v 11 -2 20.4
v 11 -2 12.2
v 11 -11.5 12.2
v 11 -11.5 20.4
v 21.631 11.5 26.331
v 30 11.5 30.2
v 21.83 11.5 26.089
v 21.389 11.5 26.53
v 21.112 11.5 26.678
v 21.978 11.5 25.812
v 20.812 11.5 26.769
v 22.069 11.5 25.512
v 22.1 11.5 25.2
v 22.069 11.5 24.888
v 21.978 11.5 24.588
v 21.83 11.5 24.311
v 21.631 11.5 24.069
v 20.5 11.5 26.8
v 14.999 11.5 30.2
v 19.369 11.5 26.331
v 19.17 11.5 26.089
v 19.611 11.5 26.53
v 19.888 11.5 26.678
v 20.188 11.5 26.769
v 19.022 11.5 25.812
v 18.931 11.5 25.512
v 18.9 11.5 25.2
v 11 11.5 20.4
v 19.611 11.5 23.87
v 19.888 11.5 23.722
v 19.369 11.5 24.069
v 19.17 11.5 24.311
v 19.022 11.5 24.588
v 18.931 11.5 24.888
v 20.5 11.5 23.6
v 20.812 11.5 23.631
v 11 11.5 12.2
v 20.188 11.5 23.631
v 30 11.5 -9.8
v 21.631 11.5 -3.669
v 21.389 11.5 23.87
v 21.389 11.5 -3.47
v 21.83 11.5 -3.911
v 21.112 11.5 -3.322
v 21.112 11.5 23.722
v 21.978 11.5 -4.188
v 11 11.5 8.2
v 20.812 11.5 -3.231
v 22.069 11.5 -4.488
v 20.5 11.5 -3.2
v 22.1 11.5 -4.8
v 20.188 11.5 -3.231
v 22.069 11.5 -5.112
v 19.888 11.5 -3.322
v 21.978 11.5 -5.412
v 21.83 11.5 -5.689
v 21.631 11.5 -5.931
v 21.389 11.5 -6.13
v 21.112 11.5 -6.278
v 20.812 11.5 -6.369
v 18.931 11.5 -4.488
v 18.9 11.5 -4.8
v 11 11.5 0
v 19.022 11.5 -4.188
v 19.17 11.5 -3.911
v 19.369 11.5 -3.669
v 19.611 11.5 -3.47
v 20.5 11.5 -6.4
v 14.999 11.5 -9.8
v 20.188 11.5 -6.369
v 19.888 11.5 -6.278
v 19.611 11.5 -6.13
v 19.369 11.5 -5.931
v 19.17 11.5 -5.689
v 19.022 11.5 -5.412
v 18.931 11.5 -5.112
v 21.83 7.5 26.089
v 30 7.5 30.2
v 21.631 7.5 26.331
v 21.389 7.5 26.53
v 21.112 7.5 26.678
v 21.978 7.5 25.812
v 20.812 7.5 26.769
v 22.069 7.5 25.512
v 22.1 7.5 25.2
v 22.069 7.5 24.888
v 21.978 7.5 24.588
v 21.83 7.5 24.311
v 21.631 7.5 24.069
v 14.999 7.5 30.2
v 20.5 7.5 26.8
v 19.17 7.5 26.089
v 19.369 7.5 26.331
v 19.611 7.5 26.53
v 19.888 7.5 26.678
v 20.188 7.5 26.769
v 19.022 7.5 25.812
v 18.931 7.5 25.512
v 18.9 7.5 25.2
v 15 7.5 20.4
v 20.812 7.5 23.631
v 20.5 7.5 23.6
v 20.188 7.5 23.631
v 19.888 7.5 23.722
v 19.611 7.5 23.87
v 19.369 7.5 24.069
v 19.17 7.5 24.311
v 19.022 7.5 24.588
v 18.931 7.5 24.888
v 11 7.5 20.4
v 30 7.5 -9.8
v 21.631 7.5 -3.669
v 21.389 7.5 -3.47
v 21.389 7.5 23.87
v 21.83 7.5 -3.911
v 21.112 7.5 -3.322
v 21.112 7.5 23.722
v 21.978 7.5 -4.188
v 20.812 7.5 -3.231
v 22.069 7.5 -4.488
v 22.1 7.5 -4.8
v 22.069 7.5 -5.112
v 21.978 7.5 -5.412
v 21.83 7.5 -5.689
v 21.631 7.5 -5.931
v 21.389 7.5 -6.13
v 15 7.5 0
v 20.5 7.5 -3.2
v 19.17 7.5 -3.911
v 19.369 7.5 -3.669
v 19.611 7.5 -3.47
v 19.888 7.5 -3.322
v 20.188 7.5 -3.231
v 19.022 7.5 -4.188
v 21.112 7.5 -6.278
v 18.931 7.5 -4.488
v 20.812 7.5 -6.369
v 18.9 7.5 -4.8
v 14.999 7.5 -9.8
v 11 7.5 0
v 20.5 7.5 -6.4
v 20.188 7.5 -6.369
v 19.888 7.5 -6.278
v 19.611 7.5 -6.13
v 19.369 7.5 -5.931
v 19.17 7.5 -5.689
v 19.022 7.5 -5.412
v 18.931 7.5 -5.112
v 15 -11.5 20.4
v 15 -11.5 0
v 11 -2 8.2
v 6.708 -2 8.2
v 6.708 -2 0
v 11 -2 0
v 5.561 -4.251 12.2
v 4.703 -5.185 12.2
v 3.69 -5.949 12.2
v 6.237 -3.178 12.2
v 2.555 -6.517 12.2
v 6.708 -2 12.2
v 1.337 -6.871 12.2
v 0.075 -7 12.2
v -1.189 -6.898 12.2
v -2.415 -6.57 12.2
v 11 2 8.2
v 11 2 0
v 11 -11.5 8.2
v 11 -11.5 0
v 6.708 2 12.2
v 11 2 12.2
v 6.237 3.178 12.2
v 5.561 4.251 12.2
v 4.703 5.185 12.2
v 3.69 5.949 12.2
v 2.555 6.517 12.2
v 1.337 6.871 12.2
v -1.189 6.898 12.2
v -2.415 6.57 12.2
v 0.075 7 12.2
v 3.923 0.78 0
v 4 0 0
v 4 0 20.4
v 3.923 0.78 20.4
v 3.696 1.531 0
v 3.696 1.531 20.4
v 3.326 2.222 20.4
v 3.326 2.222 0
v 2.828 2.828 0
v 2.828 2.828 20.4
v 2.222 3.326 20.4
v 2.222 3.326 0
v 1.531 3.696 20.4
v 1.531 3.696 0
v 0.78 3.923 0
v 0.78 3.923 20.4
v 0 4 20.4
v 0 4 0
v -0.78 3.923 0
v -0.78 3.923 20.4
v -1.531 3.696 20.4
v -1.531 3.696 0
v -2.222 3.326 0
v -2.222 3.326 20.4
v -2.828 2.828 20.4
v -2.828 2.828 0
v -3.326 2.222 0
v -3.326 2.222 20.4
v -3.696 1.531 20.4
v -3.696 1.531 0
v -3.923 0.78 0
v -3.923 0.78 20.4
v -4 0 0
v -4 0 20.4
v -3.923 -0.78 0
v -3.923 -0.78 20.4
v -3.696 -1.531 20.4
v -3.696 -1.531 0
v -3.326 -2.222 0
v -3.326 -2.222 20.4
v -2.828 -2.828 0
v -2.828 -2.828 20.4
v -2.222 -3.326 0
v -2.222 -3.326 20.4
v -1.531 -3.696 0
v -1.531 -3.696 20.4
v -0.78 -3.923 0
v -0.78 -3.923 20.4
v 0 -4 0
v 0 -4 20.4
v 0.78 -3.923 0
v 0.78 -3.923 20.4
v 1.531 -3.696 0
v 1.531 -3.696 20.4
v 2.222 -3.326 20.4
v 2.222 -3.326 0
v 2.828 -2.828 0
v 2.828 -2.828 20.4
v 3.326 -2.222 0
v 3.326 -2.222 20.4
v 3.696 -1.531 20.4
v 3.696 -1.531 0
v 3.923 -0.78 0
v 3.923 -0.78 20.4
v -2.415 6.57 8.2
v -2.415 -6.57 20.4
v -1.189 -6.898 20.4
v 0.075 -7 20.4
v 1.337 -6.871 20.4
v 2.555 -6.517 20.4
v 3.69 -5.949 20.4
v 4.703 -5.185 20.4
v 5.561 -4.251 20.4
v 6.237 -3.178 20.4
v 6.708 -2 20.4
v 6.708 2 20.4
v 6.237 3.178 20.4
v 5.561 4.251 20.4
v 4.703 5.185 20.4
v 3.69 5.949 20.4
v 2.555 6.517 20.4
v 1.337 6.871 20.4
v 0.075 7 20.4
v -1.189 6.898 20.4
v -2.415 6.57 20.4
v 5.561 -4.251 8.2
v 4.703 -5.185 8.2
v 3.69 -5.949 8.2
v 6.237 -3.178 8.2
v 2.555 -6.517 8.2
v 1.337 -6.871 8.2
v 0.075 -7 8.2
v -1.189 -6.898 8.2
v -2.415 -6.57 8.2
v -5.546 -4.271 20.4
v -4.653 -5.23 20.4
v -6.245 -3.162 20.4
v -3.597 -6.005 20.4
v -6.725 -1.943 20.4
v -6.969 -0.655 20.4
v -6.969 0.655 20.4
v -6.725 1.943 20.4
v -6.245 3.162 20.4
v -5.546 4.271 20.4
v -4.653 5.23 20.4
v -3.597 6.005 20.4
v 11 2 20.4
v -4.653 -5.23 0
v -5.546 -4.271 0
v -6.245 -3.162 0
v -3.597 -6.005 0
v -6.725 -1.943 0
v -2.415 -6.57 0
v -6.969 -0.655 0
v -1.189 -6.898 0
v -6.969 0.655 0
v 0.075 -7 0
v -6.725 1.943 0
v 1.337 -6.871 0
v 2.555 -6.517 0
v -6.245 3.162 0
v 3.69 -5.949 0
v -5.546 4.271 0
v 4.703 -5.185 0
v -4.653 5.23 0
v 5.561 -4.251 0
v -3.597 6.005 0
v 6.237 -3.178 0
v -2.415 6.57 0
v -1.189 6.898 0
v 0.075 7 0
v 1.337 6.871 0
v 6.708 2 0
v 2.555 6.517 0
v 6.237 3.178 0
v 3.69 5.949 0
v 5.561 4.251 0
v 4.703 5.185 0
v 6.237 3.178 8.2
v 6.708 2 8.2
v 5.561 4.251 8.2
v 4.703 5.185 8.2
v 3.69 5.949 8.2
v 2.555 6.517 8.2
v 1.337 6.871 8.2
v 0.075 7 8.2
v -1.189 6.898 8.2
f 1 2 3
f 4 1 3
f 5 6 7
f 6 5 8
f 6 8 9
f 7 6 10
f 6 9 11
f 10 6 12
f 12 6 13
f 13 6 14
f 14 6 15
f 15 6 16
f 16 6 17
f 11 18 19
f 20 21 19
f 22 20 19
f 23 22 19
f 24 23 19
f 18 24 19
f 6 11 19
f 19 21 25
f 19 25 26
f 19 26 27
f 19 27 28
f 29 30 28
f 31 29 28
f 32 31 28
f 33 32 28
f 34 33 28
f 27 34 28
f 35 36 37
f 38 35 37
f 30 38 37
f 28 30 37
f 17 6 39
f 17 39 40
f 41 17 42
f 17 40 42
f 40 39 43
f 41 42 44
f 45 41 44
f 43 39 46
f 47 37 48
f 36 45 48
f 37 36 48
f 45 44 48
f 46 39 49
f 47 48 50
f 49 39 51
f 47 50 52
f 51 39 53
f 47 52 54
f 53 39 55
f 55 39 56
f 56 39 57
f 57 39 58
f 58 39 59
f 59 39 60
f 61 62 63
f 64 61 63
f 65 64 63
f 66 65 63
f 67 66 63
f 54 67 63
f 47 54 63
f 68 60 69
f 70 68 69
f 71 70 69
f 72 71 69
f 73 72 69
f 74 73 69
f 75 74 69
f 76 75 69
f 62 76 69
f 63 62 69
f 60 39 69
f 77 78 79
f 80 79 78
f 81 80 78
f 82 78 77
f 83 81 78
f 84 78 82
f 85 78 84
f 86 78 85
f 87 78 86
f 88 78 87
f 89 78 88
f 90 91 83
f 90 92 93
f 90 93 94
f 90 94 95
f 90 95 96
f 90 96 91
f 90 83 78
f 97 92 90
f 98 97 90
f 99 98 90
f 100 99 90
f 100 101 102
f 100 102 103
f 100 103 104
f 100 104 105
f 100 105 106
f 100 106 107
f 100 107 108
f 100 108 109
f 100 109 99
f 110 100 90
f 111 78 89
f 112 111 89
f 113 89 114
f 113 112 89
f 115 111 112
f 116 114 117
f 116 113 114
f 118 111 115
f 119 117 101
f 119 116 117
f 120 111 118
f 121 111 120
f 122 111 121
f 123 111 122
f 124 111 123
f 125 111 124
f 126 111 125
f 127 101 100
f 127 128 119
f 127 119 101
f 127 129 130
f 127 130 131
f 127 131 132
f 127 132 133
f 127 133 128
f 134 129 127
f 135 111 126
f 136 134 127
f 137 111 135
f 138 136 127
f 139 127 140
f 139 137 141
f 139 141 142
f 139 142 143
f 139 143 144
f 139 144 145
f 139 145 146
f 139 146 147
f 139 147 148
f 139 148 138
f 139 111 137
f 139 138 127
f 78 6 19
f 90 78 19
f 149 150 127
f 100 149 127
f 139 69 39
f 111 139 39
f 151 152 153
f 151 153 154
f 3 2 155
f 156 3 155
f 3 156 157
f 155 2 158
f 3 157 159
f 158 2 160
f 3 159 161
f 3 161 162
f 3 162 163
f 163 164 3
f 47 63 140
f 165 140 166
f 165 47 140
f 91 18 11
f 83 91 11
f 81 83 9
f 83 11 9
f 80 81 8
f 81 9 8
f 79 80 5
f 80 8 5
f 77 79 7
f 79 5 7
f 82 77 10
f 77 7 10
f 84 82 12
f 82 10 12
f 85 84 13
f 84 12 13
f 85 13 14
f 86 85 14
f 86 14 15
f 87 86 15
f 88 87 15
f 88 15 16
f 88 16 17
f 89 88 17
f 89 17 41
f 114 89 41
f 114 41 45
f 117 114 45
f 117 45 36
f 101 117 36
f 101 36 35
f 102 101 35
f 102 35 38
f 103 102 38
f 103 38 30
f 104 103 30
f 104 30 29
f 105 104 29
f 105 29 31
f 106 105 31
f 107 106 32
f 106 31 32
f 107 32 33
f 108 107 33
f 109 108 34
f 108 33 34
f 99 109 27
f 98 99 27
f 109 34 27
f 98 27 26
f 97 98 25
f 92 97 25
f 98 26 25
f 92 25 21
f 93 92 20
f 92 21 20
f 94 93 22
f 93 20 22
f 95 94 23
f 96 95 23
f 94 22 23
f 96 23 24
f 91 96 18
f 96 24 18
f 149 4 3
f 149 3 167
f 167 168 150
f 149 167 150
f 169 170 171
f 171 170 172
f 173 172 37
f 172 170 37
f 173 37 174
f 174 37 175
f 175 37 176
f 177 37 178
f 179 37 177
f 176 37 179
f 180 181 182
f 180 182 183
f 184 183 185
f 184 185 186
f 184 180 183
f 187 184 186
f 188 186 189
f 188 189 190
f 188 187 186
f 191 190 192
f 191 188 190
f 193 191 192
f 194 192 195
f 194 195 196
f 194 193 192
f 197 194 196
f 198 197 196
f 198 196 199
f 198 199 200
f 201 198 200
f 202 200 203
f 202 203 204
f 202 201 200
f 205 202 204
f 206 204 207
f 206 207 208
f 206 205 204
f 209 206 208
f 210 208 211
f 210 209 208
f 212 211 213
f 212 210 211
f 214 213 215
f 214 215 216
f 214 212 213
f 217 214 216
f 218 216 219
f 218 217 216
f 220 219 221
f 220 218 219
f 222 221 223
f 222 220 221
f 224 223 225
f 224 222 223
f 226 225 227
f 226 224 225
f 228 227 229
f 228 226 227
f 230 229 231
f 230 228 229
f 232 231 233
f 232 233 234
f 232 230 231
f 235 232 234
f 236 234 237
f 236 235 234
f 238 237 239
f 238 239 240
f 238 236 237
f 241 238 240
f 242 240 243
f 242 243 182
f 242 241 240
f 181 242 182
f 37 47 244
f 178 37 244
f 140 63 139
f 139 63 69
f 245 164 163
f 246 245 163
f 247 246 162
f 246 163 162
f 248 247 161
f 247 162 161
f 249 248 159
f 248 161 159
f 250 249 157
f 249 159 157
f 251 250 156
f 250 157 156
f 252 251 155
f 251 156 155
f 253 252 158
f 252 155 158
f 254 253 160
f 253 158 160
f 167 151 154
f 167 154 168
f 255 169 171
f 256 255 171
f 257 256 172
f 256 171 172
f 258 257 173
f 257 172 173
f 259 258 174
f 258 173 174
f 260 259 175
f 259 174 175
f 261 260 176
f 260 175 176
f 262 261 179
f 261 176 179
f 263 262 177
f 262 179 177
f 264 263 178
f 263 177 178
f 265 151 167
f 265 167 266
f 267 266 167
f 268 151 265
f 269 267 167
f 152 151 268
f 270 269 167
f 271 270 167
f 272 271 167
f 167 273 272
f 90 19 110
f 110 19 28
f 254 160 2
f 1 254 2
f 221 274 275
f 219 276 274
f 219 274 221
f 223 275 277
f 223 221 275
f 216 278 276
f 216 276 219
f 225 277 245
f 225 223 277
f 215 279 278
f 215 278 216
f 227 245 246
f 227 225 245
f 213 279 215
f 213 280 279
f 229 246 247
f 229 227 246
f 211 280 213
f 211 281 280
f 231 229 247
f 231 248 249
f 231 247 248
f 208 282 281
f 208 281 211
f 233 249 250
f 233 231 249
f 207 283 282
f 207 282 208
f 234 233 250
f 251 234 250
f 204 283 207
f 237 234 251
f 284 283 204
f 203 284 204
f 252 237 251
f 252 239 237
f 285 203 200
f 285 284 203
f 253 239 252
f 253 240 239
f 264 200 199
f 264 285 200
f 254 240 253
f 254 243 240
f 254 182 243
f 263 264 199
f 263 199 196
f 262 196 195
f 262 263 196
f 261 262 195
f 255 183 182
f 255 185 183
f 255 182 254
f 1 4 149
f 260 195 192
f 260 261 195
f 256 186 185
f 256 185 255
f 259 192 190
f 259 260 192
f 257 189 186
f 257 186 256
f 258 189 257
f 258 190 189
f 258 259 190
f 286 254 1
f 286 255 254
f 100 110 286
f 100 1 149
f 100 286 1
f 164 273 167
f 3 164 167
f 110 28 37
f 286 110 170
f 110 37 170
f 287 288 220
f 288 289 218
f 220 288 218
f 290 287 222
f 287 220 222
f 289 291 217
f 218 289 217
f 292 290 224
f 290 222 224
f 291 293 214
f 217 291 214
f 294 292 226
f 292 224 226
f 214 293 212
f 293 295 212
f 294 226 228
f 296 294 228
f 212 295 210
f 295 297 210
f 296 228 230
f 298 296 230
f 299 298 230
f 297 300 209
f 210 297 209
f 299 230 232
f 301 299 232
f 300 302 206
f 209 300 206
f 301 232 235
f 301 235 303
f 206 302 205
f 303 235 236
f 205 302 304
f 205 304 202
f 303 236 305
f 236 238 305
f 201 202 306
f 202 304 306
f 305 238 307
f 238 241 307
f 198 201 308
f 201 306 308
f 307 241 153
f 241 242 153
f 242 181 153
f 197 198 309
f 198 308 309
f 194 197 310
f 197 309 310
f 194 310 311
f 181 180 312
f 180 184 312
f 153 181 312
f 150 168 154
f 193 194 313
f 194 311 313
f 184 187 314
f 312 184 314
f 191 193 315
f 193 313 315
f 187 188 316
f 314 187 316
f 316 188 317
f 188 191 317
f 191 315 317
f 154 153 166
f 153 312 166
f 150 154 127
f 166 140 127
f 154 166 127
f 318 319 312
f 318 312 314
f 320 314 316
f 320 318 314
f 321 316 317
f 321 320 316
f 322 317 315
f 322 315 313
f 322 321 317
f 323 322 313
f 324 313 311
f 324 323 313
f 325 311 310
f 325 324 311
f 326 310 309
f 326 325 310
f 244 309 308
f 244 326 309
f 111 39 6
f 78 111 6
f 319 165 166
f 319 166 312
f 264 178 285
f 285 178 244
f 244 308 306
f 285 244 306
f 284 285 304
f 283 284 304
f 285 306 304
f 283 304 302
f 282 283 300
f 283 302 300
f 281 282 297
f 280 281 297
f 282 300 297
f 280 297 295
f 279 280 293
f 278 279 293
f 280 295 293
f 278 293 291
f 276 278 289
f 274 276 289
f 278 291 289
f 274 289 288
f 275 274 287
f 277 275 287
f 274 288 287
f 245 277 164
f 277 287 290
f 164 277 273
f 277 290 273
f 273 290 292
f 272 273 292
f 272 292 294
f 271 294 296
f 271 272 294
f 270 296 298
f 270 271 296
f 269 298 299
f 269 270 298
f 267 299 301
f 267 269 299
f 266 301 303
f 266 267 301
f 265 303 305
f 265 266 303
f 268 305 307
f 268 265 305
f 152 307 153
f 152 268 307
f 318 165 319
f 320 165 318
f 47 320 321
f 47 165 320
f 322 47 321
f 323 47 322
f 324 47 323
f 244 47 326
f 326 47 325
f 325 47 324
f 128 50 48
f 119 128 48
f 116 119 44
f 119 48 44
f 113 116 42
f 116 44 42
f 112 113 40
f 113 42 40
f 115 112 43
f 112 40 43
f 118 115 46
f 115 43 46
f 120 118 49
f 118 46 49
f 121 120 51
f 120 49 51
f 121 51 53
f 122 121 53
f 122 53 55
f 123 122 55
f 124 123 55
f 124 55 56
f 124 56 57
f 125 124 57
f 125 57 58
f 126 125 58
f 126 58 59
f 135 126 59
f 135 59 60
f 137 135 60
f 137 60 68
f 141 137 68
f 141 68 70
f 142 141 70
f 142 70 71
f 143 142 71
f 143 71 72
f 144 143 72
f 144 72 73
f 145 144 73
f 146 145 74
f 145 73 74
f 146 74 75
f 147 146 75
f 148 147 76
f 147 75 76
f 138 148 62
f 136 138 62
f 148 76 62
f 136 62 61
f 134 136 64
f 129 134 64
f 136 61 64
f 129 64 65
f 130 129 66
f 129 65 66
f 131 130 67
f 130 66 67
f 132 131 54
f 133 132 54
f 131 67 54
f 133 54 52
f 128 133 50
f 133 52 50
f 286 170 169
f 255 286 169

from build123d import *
from build123d.topology import SkipClean

# Parameters (mm, degrees)
SKETCH1_R           = 4
BOSS_EXTRUDE1_DEPTH = 20.4
CUT_EXTRUDE3_START  = -2
CUT_EXTRUDE3_DEPTH  = 32.708900902
CUT_EXTRUDE4_START  = 2
CUT_EXTRUDE4_DEPTH  = 32.708900902
BOSS_EXTRUDE2_DEPTH = 4
CUT_EXTRUDE5_REACH  = 50.384
SKETCH7_R           = 1.6


with BuildPart() as part:
    # Sketch1 → Boss-Extrude1 (new body)
    with BuildSketch(Plane.XY):
        with BuildLine():
            Line((-2.414508498, -6.570399433), (11, -11.5))
            Line((11, -11.5), (15, -11.5))
            Line((15, -11.5), (15, 7.5))
            Line((15, 7.5), (30, 7.5))
            Line((30, 7.5), (30, 11.5))
            Line((30, 11.5), (11, 11.5))
            Line((11, 11.5), (-2.414508498, 6.570399433))
            ThreePointArc((-2.414508498, 6.570399433), (-7, 0), (-2.414508498, -6.570399433))
        make_face()
        Circle(SKETCH1_R, mode=Mode.SUBTRACT)
    extrude(amount=BOSS_EXTRUDE1_DEPTH)

    # Sketch5 → Cut-Extrude3 (cut, through all)
    with SkipClean():  # the faces are left unmerged after this step: merging them gives an invalid solid
        with BuildSketch(Plane.XY.offset(10.2).offset(CUT_EXTRUDE3_START)):
            with BuildLine():
                Line((11, -11.5), (11, -2))
                Line((11, -2), (6.708203932, -2))
                ThreePointArc((6.708203932, -2), (3.135457361, -6.258506782), (-2.414508498, -6.570399433))
                Line((-2.414508498, -6.570399433), (11, -11.5))
            make_face()
            with BuildLine():
                Line((11, 2), (11, 11.5))
                Line((11, 11.5), (-2.414508498, 6.570399433))
                ThreePointArc((-2.414508498, 6.570399433), (3.135457361, 6.258506782), (6.708203932, 2))
                Line((6.708203932, 2), (11, 2))
            make_face()
        extrude(amount=-CUT_EXTRUDE3_DEPTH, mode=Mode.SUBTRACT)

    # Sketch5<5> → Cut-Extrude4 (cut, through all)
    with SkipClean():  # the faces are left unmerged after this step: merging them gives an invalid solid
        with BuildSketch(Plane.XY.offset(10.2).offset(CUT_EXTRUDE4_START)):
            with BuildLine():
                Line((11, -11.5), (11, -2))
                Line((11, -2), (6.708203932, -2))
                ThreePointArc((6.708203932, -2), (3.135457361, -6.258506782), (-2.414508498, -6.570399433))
                Line((-2.414508498, -6.570399433), (11, -11.5))
            make_face()
            with BuildLine():
                Line((11, 2), (11, 11.5))
                Line((11, 11.5), (-2.414508498, 6.570399433))
                ThreePointArc((-2.414508498, 6.570399433), (3.135457361, 6.258506782), (6.708203932, 2))
                Line((6.708203932, 2), (11, 2))
            make_face()
        extrude(amount=CUT_EXTRUDE4_DEPTH, mode=Mode.SUBTRACT)

    # Sketch6 → Boss-Extrude2 (add)
    with SkipClean():  # the faces are left unmerged after this step: merging them gives an invalid solid
        with BuildSketch(Plane(origin=(0, 11.5, 0), x_dir=(1, 0, 0), z_dir=(0, 1, 0))):
            Polygon((14.99930592, 9.8), (30, 9.8), (30, -30.2), (14.99930592, -30.2), (11, -20.4), (11, 0), align=None)
        extrude(amount=-BOSS_EXTRUDE2_DEPTH)

    # Sketch7 → Cut-Extrude5 (cut, up to next)
    with BuildSketch(Plane(origin=(0, 11.5, 0), x_dir=(1, 0, 0), z_dir=(0, 1, 0)), mode=Mode.PRIVATE) as cut_extrude5_sk1:
        with Locations((20.5, 4.8)):
            Circle(SKETCH7_R)
    cut_extrude5_tool1 = extrude(cut_extrude5_sk1.sketch, amount=-CUT_EXTRUDE5_REACH, mode=Mode.PRIVATE) & part.part
    # Sketch7 → Cut-Extrude5 (cut, up to next)
    with BuildSketch(Plane(origin=(0, 11.5, 0), x_dir=(1, 0, 0), z_dir=(0, 1, 0)), mode=Mode.PRIVATE) as cut_extrude5_sk2:
        with Locations((20.5, -25.2)):
            Circle(SKETCH7_R)
    cut_extrude5_tool2 = extrude(cut_extrude5_sk2.sketch, amount=-CUT_EXTRUDE5_REACH, mode=Mode.PRIVATE) & part.part
    add(cut_extrude5_tool1.solids().sort_by_distance((20.5, 11.5, -4.8))[0], mode=Mode.SUBTRACT)
    add(cut_extrude5_tool2.solids().sort_by_distance((20.5, 11.5, 25.2))[0], mode=Mode.SUBTRACT)


solid = part.part
